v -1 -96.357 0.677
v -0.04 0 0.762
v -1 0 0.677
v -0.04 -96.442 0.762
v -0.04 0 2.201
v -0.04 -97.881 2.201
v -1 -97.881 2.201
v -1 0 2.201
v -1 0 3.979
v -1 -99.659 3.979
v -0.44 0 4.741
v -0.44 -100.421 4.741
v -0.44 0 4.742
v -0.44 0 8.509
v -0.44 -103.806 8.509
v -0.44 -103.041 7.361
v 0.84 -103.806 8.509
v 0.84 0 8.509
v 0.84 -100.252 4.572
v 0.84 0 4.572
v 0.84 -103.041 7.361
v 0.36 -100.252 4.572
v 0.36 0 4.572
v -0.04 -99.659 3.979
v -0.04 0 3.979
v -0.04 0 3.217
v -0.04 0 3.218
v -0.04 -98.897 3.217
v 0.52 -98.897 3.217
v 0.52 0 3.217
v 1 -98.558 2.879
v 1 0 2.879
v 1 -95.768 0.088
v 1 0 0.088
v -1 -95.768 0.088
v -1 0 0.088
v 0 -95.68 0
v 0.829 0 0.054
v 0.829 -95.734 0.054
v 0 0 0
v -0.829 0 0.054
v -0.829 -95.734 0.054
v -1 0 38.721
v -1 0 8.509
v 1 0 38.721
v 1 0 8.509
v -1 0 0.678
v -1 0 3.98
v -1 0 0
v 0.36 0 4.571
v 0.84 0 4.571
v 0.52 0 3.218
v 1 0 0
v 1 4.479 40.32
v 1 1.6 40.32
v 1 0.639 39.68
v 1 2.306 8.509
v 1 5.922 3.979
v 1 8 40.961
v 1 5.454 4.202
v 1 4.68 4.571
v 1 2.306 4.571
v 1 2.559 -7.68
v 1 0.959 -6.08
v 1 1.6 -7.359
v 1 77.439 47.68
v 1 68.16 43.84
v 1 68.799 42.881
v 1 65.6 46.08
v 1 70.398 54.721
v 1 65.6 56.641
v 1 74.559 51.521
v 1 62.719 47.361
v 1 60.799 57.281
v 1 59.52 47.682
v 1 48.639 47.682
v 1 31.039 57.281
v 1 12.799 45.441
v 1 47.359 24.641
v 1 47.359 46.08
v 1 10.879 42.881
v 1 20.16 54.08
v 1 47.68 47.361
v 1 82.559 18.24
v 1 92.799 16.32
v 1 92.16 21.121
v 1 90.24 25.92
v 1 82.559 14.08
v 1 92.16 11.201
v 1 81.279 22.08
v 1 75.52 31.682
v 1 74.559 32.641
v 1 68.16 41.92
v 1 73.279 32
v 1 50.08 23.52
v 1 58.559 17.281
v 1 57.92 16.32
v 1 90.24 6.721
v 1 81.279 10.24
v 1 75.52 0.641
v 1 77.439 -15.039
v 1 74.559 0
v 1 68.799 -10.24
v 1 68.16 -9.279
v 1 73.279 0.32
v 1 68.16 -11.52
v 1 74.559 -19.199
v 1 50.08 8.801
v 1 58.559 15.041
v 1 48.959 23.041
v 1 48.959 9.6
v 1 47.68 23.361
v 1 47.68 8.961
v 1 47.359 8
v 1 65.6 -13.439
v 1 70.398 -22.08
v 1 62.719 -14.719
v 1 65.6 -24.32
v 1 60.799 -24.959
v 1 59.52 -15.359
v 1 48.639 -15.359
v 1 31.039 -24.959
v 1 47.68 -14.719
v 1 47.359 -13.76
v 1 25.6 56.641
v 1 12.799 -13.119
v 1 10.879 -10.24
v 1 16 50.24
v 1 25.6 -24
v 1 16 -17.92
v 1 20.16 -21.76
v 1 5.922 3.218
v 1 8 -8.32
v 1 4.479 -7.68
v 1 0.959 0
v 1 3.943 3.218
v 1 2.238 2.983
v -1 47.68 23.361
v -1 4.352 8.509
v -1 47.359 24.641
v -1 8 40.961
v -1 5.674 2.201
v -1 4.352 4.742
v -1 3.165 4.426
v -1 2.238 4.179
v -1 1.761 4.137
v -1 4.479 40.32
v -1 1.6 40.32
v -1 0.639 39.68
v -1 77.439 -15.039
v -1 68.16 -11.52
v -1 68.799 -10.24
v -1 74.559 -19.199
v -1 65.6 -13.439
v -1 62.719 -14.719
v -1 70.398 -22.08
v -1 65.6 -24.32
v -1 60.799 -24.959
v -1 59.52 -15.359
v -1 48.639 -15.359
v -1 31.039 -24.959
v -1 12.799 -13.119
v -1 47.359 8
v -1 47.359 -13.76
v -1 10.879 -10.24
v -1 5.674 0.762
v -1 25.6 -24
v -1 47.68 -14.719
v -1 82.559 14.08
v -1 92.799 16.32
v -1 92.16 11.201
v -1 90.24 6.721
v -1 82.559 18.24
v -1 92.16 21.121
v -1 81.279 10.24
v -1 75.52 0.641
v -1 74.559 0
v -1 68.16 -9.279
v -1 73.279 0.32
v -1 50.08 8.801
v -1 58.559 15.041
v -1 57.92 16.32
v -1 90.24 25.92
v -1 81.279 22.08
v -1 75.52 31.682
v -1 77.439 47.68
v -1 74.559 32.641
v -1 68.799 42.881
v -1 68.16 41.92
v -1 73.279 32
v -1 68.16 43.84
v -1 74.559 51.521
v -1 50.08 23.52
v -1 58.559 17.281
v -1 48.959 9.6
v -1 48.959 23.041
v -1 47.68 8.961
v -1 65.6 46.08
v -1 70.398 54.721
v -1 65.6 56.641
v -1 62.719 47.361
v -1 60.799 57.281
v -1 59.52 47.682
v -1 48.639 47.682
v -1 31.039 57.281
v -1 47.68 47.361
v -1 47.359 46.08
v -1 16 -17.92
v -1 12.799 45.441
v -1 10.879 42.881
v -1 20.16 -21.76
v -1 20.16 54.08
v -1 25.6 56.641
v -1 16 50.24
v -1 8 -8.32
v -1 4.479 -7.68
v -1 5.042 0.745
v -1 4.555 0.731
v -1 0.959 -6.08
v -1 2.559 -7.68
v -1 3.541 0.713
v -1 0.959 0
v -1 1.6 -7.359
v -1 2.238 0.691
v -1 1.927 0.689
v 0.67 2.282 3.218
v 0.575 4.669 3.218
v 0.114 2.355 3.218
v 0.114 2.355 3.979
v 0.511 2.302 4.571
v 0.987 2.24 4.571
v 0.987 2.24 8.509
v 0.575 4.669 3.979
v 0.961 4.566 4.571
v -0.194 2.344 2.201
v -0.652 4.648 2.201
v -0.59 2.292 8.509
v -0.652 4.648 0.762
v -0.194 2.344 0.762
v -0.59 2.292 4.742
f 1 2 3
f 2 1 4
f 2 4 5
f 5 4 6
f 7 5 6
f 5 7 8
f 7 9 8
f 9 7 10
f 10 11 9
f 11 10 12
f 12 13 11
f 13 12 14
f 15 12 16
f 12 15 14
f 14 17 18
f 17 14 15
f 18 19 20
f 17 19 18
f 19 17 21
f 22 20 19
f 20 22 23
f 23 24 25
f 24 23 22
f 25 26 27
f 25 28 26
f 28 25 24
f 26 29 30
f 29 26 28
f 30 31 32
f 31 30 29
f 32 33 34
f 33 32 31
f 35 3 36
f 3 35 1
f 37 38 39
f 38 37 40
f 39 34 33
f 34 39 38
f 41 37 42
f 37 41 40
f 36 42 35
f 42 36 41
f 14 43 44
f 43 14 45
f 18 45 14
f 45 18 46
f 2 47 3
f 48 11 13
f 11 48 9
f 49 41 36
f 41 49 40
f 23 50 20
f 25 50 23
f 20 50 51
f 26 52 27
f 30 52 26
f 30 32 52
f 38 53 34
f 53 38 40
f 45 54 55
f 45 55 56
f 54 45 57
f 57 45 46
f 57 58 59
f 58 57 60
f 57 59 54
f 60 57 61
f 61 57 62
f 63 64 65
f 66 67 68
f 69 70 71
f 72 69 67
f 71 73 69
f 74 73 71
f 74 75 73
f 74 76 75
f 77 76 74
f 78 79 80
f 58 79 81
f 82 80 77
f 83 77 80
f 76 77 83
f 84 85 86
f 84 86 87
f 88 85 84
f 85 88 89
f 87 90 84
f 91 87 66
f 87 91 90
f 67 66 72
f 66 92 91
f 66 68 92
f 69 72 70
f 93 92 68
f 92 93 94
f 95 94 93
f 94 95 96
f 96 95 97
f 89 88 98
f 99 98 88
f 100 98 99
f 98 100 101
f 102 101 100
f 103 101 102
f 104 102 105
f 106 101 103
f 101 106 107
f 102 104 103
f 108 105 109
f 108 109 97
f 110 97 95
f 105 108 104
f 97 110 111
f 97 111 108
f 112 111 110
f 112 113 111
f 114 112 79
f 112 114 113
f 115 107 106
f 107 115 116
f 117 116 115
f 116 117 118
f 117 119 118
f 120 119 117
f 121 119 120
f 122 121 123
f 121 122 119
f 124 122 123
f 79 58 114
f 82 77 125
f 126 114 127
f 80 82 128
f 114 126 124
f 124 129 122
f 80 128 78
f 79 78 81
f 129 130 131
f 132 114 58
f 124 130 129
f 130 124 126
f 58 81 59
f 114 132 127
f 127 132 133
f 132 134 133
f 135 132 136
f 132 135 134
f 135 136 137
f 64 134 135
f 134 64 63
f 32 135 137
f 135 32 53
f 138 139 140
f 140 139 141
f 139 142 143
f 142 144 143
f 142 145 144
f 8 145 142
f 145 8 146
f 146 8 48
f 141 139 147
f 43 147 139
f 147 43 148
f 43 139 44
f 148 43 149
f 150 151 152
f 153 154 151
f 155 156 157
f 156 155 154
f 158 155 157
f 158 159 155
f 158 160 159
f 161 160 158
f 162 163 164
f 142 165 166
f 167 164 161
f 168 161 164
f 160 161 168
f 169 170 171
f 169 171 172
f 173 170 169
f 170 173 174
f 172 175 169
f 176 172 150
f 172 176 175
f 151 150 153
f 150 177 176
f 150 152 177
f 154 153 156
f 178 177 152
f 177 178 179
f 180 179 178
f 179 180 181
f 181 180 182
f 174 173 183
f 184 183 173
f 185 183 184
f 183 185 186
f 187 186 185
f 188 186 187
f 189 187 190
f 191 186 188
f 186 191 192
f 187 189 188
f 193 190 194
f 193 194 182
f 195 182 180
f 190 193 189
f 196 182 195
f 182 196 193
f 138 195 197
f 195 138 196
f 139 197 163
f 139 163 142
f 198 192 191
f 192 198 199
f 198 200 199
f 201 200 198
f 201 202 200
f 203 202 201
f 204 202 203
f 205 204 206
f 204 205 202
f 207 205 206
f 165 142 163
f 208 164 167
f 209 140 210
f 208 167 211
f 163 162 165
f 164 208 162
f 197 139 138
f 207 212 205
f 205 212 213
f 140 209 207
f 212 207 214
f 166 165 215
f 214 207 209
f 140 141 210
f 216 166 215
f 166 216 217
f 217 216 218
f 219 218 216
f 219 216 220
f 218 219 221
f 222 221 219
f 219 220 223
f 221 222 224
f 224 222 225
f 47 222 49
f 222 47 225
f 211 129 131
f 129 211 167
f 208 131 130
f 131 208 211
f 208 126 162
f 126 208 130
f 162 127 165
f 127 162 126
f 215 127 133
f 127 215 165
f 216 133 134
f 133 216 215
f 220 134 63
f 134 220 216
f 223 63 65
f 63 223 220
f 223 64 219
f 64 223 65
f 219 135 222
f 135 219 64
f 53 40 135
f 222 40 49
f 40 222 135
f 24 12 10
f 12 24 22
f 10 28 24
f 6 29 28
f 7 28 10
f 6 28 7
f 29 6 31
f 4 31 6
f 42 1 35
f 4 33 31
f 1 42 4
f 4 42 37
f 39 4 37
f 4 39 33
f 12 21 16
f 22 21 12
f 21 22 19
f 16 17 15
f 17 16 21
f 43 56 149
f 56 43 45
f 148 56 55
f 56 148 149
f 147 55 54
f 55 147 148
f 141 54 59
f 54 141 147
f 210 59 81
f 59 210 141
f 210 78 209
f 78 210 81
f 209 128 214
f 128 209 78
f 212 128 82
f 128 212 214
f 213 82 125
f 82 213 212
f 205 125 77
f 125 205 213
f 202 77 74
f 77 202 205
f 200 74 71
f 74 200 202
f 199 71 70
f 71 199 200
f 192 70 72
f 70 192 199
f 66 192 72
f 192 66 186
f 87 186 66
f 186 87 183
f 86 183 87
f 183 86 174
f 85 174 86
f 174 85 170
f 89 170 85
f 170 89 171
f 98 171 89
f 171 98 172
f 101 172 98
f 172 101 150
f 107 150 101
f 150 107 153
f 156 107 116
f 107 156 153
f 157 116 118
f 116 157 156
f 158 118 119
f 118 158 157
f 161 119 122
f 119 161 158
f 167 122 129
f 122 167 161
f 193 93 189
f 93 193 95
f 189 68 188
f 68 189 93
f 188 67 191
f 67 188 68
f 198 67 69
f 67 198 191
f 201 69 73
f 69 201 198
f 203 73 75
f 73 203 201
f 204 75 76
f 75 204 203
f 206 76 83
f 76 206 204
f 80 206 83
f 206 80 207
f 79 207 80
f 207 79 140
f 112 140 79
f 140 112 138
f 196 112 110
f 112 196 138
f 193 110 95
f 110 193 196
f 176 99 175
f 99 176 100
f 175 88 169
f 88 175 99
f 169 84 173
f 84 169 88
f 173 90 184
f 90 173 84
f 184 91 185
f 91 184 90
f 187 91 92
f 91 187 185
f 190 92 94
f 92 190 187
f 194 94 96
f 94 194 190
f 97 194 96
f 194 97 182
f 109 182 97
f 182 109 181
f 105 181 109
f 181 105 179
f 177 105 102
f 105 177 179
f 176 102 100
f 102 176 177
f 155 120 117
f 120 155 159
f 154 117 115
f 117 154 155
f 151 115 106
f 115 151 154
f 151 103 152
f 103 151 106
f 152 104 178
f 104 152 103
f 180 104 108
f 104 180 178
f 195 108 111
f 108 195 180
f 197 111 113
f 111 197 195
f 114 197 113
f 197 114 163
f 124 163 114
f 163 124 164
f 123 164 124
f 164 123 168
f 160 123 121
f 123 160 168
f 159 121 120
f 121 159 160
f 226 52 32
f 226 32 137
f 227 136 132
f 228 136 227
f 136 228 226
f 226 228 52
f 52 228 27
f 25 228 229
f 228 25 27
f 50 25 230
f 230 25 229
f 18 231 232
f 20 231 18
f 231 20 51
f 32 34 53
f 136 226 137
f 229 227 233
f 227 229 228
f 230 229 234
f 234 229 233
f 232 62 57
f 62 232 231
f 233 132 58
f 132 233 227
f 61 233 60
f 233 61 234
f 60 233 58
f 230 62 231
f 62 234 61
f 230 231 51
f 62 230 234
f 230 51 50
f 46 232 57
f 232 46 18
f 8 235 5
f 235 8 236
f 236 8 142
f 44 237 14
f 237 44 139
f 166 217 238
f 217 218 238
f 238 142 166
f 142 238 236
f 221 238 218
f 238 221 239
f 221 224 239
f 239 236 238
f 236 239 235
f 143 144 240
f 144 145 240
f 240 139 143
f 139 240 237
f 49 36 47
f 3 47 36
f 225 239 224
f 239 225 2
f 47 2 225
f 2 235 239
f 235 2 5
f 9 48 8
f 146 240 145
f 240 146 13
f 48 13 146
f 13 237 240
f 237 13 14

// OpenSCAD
// file: gen/kwikset.gen.scad
// Automatically generated using the Inkscape to OpenSCAD Converter
// Variable names are of the form <inkscape-path-id>_points and
// <inkscape-path-id>_paths.  As a result, you can associate a polygon in this
// OpenSCAD program with the corresponding SVG element in the Inkscape document
// by looking for the XML element with the attribute id="inkscape-path-id".

outline_points = [[-16.682359, -40.298727], [-21.483139, -40.939357], [-26.281970, -42.859276], [-30.442129, -46.058496], [-33.322990, -49.900286], [-46.123770, -71.660056], [-48.043689, -76.458887], [-48.682359, -81.259666], [-48.043689, -86.378806], [-46.123770, -90.859277], [-33.322990, -112.619036], [-30.442129, -116.779197], [-26.281970, -119.660056], [-21.483139, -121.900286], [-16.682359, -122.538967], [13.077401, -122.538967], [18.516861, -121.579977], [23.956311, -119.339747], [28.116470, -115.499897], [31.317640, -110.699117], [33.237560, -107.820217], [36.116470, -105.900287], [39.637950, -105.259667], [41.557870, -105.259667], [42.516860, -104.939357], [43.157480, -103.660057], [43.157480, -97.579977], [139.796150, -97.579977], [147.157480, -90.218647], [148.436780, -88.298727], [149.077400, -85.740137], [148.436780, -83.499897], [147.157480, -81.579977], [132.837170, -65.419467], [44.116470, -65.419827], [44.116470, -58.859277], [43.477790, -57.900287], [42.516861, -57.259667], [39.637951, -57.259667], [36.116471, -56.619037], [33.237561, -54.699117], [31.317641, -52.138567], [28.116471, -47.339747], [23.956311, -43.499897], [18.516861, -40.939357], [13.077401, -40.298727], [-15.403059, -49.898337], [-4.522209, -49.898337], [-3.563219, -50.218647], [-3.242909, -51.499897], [-3.242909, -72.939357], [-3.563219, -74.218647], [-4.842519, -74.538967], [-5.963609, -74.060447], [-24.043689, -55.660056], [-24.682359, -54.699117], [-24.043689, -53.740137], [-21.483139, -51.499897], [-18.602279, -50.218647], [-30.442129, -64.939357], [-29.162829, -65.579977], [-14.442129, -80.298727], [-13.803460, -81.259667], [-14.442129, -82.538967], [-29.162829, -97.259667], [-30.442129, -97.579977], [-31.403059, -96.939357], [-37.162829, -87.339747], [-38.442129, -83.499897], [-38.442129, -79.339747], [-37.162829, -75.499897], [-31.403059, -65.898337], [-4.842520, -87.980367], [-3.563220, -88.619037], [-3.242909, -89.579977], [-3.242909, -111.339747], [-3.563220, -112.298727], [-4.522210, -112.939357], [-15.403060, -112.939357], [-18.602280, -112.298727], [-21.483140, -111.019427], [-24.043690, -109.099507], [-24.682360, -107.820217], [-24.043690, -106.859277], [-5.963610, -88.779197]];
outline_paths = [[0, 1, 2, 3, 4, 5, 6, 7, 8, 9, 10, 11, 12, 13, 14, 15, 16, 17, 18, 19, 20, 21, 22, 23, 24, 25, 26, 27, 28, 29, 30, 31, 32, 33, 34, 35, 36, 37, 38, 39, 40, 41, 42, 43, 44, 45], [58, 57, 56, 55, 54, 53, 52, 51, 50, 49, 48, 47, 46], [71, 70, 69, 68, 67, 66, 65, 64, 63, 62, 61, 60, 59], [84, 83, 82, 81, 80, 79, 78, 77, 76, 75, 74, 73, 72]];

warding_kw1_points = [[-91.133659, 110.770103], [-91.133659, 107.891433], [-89.133657, 107.891418], [-89.133657, 108.568733], [-90.093664, 108.653433], [-90.093664, 110.092748], [-89.133657, 110.092748], [-89.133657, 111.870748], [-89.693658, 112.632733], [-89.693658, 116.400553], [-90.973663, 116.400553], [-90.973663, 112.463403], [-90.493662, 112.463403], [-90.093664, 111.870733], [-90.093664, 111.108733], [-90.653659, 111.108733], [-91.133660, 110.770063]];
warding_kw1_paths = [[0, 1, 2, 3, 4, 5, 6, 7, 8, 9, 10, 11, 12, 13, 14, 15, 16]];

engrave_points = [[-125.793622, 118.058646], [-126.556072, 118.051646], [-127.487402, 118.305646], [-128.334071, 118.898306], [-128.842072, 119.744976], [-129.604072, 120.845646], [-130.704742, 121.776966], [-131.890072, 122.369636], [-133.244742, 122.538966], [-141.118737, 122.538966], [-142.304070, 122.369636], [-143.404737, 121.946306], [-144.420737, 121.184306], [-145.098070, 120.252966], [-148.400068, 114.495636], [-148.908068, 113.394976], [-149.077401, 112.209636], [-148.908068, 111.024306], [-148.442401, 109.923637], [-145.098070, 104.166307], [-144.420737, 103.150306], [-143.404737, 102.472977], [-142.304070, 101.964977], [-141.118737, 101.795647], [-133.244742, 101.795647], [-131.890072, 102.049647], [-130.704742, 102.557647], [-129.604072, 103.488977], [-128.842072, 104.674307], [-128.334071, 105.436307], [-127.656742, 106.028976], [-126.725402, 106.282977], [-125.793622, 106.282977]];
engrave_paths = [[0, 1, 2, 3, 4, 5, 6, 7, 8, 9, 10, 11, 12, 13, 14, 15, 16, 17, 18, 19, 20, 21, 22, 23, 24, 25, 26, 27, 28, 29, 30, 31, 32]];

//polygon(points=outline_points, paths=outline_paths);
//polygon(points=warding_kw1_points, paths=warding_kw1_paths);
//polygon(points=engrave_points, paths=engrave_paths);
// file: keygen.scad
$inf=1000;
$eps=.001;

function key_move(points, offset) = [
    for(p=points) [p[0] + offset[0],
                   p[1] + offset[1]]
];

module key_outline(outline_points, thickness, outline_paths=undef) {
    rotate(-90, [0, 1, 0]) rotate(-90, [0, 0, 1]) // Rotate into the correct plane
        linear_extrude(height=thickness, center=true) // Extrude the key outline
            polygon(points=outline_points, paths=outline_paths); // Draw the outline
}

module key_blade(warding, plug_diameter=0) {
    // Draw the blade to infinity in Y
    // optionally intersected with the plug cylinder
    // to round the bottom
    intersection() {
        rotate(180, [0, 0, 1]) rotate(90, [1, 0, 0])
            linear_extrude(height=2*$inf, center=true)
                polygon(warding);

        // Draw the plug, if a plug diameter is specified
        if(plug_diameter > 0) {
            // Draw infinite cylinder in -Y
            translate([0, 0, 0.5*plug_diameter]) rotate(90, [1, 0, 0])
                cylinder(r=0.5*plug_diameter, h=$inf, center=true, $fn=$fn ? 4*$fn : 48);
        }
    }
}

module key_x_line(length) {
    // Hack to draw something close to a line in X
    // since OpenSCAD does not support line primitives
    square([length, $eps], center=true);
}

module key_warding_cutter(warding, blade_height, cutter_radius, left) {
    neg = left ? -1 : 1;
    translate([neg * cutter_radius, 0, 0])
        rotate_extrude($fn=$fn ? 4*$fn : 48)
            translate([neg * cutter_radius, 0])
                difference() {
                    translate([0, 0.5*blade_height])
                        square([2 * cutter_radius, blade_height], center=true);
                    minkowski() {
                        translate([neg * 1.5 * cutter_radius, 0])
                            key_x_line(3 * cutter_radius);
                        polygon(warding);
                    }
                    polygon(warding);
                }
}

module key_engrave(engrave_points, engrave_depth, left, thickness, engrave_paths=undef) {
    translate([(left ? -1 : 1) * 0.5*thickness, 0, 0]) rotate(-90, [0, 1, 0]) rotate(-90, [0, 0, 1]) // Translate and rotate into the correct soot
        linear_extrude(height=2*engrave_depth, center=true) // Extrude the key outline
            polygon(points=engrave_points, paths=engrave_paths); // Draw the outline
}

module key_blank(outline_points,
                warding,
                outline_paths=undef,
                engrave_right_points=[],
                engrave_right_paths=undef,
                engrave_left_points=[],
                engrave_left_paths=undef,
                bow_thickness=0,
                engrave_depth=.1,
                plug_diameter=0,
                offset=[0, 0],
                cutter_radius=18,
                milling_offset=0) {

    // Find the bounding box of the warding
    warding_min = [min([for(e=warding) e[0]]), min([for(e=warding) e[1]])];
    warding_max = [max([for(e=warding) e[0]]), max([for(e=warding) e[1]])];

    // Apply the given offset to the outline,
    // holes, and engrave
    outline_adj = key_move(outline_points, offset);
    engrave_left_adj = key_move(engrave_left_points, offset);
    engrave_right_adj = key_move(engrave_right_points, offset);

    // Move the warding profile
    // so that it is centered in X
    // and non-negative in Y
    warding_offset = [-0.5 * (warding_min[0] + warding_max[0]),
                      -warding_min[1]];
    warding_adj = key_move(warding, warding_offset);

    // Infer various key properties
    thickness = (bow_thickness == 0) ? abs(warding_max[0] - warding_min[0]) : bow_thickness;
    blade_height = abs(warding_max[1] - warding_min[1]);

    // Cut out the warding milling artifacts
    // from the bow
    difference() {
        // Create the bulk of the keyblank
        // by intersecting the outline
        // with the warding profile
        // and the plug
        intersection() {
            // Draw the key outline and holes
            key_outline(outline_adj, thickness, outline_paths);
            
            // Draw the blade, and a giant box where the bow is
            // so that we don't wipe out the bow
            // when the intersection happens
            union() {
                // Fill +Y half-space
                translate([0, $inf/2+milling_offset, 0])
                    cube([$inf, $inf, $inf], center=true);

                key_blade(warding_adj, plug_diameter);
            }
        }
        // Draw the milling wheels that cut the warding
        if(cutter_radius != 0) {
            translate([0, milling_offset, 0])
                union() {
                    key_warding_cutter(warding_adj, blade_height, cutter_radius, false);
                    key_warding_cutter(warding_adj, blade_height, cutter_radius, true);
                }
        }

        // Draw the engraveing
        key_engrave(engrave_right_adj, engrave_depth, false, thickness, engrave_right_paths);
        key_engrave(engrave_left_adj, engrave_depth, true, thickness, engrave_left_paths);
    }
}

function key_code_to_heights(code, depth_table) = [for(i=key_enum(code)) depth_table[search(code[i], "0123456789")[0]]];

module key_bitting_cutter(flat, angle, tool_height) {
    polygon([[-0.5 * flat, 0],
            [0.5 * flat, 0],
            [0.5 * flat + tan(0.5 * angle) * tool_height, tool_height],
            [-0.5 * flat - tan(0.5 * angle) * tool_height, tool_height]]);
}

module key_bitting(heights,
                   locations,
                   flat,
                   angle=100,
                   cutter_width=5,
                   cutter_height=5,
                   angles=[]) {
    // Rotate the cutting tool to the proper orientation
    rotate(-90, [0, 0, 1]) rotate(90, [1, 0, 0])
        // Union together a handful of trapezoids
        // that comprise the cuts
        union() {
            for(i=key_enum(heights)) {
                // Move to the proper location and height, and maybe rotate
                translate([locations[i], heights[i]]) rotate(i >= len(angles) ? 0 : angles[i], [0, 1, 0])
                    linear_extrude(height=cutter_width, center=true)
                        key_bitting_cutter(flat, angle, cutter_height);
            }
        }
}

module m3_slider(slider_depth) {
        // Creates a cuboid cut in the finished Medeco M3 key blank for the M3 slider element
        difference()  {
            translate([-1.4445,-slider_depth-30,0])
                cube([1,30,2.6]); //measurements of slider dimensions taken from a couple M3 keys. M3 slider depths appear to be in 0.1" increments (from 0.3" - 0.7" possibly?)
    }
	
}

function key_lkup(ks, vs, k) = vs[search([k], [for(ki=ks) [ki]])[0]];
    
function key_enum(l) = len(l) > 0 ? [for(i=[0:len(l)-1]) i] : [];

function _strcat(v, i, car, s) = (i==s ? v[i] : str(_strcat(v, i-1, car, s), str(car,v[i]) )); // from https://www.thingiverse.com/thing:202724

function _strslice(l, start, stop) =
        stop > start
        ? _strcat([for(i=[start:stop]) l[i]], stop-start, "", 0)
        : "";

function key_split_on_dash(s) = [
    for(i=[0:len(search("-", s, 0)[0])])
        _strslice(s, search("-", str("-", s), 0)[0][i], search("-", str(s, "-"), 0)[0][i]-1)
];
// main file
use <keygen.scad>
include <gen/kwikset.gen.scad>

module kwikset(bitting="",
               outline_name="KW1",
               warding_name="KW1") {

    name = "Kwikset";

    /*
        Bitting is specified from bow to tip, 1-7, with 1 being the shallowest cut and 7 being the deepest.
        Example: 25363
    */

    outlines_k = ["KW1"];
    outlines_v = [[outline_points, outline_paths,
                   [-outline_points[34][0], -outline_points[26][1]],
                   engrave_points,
                   engrave_paths]];
    wardings_k = ["KW1"];
    wardings_v = [warding_kw1_points];

    outline_param = key_lkup(outlines_k, outlines_v, outline_name);
    outline_points = outline_param[0];
    outline_paths = outline_param[1];
    offset = outline_param[2];
    engrave_points = outline_param[3];
    engrave_paths = outline_param[4];

    warding_points = key_lkup(wardings_k, wardings_v, warding_name);
    
    cut_locations = [for(i=[.247, .397, .547, .697, .847]) i*25.4];
    // Kwikset starts with 1??
    depth_table = [for(i=[0.329+0.023:-0.023:0.190]) i*25.4];

    heights = key_code_to_heights(bitting, depth_table);

    difference() {
        if($children == 0) {
            key_blank(outline_points,
                      warding_points,
                      outline_paths=outline_paths,
                      engrave_right_points=engrave_points,
                      engrave_right_paths=engrave_paths,
                      engrave_left_points=engrave_points,
                      engrave_left_paths=engrave_paths,
                      offset=offset,
                      plug_diameter=12.7);
        } else {
            children(0);
        }
        key_bitting(heights, cut_locations, 2.1336, 90);
    }
}

// Defaults
bitting="";
outline="KW1";
warding="KW1";
kwikset(bitting, outline, warding);
